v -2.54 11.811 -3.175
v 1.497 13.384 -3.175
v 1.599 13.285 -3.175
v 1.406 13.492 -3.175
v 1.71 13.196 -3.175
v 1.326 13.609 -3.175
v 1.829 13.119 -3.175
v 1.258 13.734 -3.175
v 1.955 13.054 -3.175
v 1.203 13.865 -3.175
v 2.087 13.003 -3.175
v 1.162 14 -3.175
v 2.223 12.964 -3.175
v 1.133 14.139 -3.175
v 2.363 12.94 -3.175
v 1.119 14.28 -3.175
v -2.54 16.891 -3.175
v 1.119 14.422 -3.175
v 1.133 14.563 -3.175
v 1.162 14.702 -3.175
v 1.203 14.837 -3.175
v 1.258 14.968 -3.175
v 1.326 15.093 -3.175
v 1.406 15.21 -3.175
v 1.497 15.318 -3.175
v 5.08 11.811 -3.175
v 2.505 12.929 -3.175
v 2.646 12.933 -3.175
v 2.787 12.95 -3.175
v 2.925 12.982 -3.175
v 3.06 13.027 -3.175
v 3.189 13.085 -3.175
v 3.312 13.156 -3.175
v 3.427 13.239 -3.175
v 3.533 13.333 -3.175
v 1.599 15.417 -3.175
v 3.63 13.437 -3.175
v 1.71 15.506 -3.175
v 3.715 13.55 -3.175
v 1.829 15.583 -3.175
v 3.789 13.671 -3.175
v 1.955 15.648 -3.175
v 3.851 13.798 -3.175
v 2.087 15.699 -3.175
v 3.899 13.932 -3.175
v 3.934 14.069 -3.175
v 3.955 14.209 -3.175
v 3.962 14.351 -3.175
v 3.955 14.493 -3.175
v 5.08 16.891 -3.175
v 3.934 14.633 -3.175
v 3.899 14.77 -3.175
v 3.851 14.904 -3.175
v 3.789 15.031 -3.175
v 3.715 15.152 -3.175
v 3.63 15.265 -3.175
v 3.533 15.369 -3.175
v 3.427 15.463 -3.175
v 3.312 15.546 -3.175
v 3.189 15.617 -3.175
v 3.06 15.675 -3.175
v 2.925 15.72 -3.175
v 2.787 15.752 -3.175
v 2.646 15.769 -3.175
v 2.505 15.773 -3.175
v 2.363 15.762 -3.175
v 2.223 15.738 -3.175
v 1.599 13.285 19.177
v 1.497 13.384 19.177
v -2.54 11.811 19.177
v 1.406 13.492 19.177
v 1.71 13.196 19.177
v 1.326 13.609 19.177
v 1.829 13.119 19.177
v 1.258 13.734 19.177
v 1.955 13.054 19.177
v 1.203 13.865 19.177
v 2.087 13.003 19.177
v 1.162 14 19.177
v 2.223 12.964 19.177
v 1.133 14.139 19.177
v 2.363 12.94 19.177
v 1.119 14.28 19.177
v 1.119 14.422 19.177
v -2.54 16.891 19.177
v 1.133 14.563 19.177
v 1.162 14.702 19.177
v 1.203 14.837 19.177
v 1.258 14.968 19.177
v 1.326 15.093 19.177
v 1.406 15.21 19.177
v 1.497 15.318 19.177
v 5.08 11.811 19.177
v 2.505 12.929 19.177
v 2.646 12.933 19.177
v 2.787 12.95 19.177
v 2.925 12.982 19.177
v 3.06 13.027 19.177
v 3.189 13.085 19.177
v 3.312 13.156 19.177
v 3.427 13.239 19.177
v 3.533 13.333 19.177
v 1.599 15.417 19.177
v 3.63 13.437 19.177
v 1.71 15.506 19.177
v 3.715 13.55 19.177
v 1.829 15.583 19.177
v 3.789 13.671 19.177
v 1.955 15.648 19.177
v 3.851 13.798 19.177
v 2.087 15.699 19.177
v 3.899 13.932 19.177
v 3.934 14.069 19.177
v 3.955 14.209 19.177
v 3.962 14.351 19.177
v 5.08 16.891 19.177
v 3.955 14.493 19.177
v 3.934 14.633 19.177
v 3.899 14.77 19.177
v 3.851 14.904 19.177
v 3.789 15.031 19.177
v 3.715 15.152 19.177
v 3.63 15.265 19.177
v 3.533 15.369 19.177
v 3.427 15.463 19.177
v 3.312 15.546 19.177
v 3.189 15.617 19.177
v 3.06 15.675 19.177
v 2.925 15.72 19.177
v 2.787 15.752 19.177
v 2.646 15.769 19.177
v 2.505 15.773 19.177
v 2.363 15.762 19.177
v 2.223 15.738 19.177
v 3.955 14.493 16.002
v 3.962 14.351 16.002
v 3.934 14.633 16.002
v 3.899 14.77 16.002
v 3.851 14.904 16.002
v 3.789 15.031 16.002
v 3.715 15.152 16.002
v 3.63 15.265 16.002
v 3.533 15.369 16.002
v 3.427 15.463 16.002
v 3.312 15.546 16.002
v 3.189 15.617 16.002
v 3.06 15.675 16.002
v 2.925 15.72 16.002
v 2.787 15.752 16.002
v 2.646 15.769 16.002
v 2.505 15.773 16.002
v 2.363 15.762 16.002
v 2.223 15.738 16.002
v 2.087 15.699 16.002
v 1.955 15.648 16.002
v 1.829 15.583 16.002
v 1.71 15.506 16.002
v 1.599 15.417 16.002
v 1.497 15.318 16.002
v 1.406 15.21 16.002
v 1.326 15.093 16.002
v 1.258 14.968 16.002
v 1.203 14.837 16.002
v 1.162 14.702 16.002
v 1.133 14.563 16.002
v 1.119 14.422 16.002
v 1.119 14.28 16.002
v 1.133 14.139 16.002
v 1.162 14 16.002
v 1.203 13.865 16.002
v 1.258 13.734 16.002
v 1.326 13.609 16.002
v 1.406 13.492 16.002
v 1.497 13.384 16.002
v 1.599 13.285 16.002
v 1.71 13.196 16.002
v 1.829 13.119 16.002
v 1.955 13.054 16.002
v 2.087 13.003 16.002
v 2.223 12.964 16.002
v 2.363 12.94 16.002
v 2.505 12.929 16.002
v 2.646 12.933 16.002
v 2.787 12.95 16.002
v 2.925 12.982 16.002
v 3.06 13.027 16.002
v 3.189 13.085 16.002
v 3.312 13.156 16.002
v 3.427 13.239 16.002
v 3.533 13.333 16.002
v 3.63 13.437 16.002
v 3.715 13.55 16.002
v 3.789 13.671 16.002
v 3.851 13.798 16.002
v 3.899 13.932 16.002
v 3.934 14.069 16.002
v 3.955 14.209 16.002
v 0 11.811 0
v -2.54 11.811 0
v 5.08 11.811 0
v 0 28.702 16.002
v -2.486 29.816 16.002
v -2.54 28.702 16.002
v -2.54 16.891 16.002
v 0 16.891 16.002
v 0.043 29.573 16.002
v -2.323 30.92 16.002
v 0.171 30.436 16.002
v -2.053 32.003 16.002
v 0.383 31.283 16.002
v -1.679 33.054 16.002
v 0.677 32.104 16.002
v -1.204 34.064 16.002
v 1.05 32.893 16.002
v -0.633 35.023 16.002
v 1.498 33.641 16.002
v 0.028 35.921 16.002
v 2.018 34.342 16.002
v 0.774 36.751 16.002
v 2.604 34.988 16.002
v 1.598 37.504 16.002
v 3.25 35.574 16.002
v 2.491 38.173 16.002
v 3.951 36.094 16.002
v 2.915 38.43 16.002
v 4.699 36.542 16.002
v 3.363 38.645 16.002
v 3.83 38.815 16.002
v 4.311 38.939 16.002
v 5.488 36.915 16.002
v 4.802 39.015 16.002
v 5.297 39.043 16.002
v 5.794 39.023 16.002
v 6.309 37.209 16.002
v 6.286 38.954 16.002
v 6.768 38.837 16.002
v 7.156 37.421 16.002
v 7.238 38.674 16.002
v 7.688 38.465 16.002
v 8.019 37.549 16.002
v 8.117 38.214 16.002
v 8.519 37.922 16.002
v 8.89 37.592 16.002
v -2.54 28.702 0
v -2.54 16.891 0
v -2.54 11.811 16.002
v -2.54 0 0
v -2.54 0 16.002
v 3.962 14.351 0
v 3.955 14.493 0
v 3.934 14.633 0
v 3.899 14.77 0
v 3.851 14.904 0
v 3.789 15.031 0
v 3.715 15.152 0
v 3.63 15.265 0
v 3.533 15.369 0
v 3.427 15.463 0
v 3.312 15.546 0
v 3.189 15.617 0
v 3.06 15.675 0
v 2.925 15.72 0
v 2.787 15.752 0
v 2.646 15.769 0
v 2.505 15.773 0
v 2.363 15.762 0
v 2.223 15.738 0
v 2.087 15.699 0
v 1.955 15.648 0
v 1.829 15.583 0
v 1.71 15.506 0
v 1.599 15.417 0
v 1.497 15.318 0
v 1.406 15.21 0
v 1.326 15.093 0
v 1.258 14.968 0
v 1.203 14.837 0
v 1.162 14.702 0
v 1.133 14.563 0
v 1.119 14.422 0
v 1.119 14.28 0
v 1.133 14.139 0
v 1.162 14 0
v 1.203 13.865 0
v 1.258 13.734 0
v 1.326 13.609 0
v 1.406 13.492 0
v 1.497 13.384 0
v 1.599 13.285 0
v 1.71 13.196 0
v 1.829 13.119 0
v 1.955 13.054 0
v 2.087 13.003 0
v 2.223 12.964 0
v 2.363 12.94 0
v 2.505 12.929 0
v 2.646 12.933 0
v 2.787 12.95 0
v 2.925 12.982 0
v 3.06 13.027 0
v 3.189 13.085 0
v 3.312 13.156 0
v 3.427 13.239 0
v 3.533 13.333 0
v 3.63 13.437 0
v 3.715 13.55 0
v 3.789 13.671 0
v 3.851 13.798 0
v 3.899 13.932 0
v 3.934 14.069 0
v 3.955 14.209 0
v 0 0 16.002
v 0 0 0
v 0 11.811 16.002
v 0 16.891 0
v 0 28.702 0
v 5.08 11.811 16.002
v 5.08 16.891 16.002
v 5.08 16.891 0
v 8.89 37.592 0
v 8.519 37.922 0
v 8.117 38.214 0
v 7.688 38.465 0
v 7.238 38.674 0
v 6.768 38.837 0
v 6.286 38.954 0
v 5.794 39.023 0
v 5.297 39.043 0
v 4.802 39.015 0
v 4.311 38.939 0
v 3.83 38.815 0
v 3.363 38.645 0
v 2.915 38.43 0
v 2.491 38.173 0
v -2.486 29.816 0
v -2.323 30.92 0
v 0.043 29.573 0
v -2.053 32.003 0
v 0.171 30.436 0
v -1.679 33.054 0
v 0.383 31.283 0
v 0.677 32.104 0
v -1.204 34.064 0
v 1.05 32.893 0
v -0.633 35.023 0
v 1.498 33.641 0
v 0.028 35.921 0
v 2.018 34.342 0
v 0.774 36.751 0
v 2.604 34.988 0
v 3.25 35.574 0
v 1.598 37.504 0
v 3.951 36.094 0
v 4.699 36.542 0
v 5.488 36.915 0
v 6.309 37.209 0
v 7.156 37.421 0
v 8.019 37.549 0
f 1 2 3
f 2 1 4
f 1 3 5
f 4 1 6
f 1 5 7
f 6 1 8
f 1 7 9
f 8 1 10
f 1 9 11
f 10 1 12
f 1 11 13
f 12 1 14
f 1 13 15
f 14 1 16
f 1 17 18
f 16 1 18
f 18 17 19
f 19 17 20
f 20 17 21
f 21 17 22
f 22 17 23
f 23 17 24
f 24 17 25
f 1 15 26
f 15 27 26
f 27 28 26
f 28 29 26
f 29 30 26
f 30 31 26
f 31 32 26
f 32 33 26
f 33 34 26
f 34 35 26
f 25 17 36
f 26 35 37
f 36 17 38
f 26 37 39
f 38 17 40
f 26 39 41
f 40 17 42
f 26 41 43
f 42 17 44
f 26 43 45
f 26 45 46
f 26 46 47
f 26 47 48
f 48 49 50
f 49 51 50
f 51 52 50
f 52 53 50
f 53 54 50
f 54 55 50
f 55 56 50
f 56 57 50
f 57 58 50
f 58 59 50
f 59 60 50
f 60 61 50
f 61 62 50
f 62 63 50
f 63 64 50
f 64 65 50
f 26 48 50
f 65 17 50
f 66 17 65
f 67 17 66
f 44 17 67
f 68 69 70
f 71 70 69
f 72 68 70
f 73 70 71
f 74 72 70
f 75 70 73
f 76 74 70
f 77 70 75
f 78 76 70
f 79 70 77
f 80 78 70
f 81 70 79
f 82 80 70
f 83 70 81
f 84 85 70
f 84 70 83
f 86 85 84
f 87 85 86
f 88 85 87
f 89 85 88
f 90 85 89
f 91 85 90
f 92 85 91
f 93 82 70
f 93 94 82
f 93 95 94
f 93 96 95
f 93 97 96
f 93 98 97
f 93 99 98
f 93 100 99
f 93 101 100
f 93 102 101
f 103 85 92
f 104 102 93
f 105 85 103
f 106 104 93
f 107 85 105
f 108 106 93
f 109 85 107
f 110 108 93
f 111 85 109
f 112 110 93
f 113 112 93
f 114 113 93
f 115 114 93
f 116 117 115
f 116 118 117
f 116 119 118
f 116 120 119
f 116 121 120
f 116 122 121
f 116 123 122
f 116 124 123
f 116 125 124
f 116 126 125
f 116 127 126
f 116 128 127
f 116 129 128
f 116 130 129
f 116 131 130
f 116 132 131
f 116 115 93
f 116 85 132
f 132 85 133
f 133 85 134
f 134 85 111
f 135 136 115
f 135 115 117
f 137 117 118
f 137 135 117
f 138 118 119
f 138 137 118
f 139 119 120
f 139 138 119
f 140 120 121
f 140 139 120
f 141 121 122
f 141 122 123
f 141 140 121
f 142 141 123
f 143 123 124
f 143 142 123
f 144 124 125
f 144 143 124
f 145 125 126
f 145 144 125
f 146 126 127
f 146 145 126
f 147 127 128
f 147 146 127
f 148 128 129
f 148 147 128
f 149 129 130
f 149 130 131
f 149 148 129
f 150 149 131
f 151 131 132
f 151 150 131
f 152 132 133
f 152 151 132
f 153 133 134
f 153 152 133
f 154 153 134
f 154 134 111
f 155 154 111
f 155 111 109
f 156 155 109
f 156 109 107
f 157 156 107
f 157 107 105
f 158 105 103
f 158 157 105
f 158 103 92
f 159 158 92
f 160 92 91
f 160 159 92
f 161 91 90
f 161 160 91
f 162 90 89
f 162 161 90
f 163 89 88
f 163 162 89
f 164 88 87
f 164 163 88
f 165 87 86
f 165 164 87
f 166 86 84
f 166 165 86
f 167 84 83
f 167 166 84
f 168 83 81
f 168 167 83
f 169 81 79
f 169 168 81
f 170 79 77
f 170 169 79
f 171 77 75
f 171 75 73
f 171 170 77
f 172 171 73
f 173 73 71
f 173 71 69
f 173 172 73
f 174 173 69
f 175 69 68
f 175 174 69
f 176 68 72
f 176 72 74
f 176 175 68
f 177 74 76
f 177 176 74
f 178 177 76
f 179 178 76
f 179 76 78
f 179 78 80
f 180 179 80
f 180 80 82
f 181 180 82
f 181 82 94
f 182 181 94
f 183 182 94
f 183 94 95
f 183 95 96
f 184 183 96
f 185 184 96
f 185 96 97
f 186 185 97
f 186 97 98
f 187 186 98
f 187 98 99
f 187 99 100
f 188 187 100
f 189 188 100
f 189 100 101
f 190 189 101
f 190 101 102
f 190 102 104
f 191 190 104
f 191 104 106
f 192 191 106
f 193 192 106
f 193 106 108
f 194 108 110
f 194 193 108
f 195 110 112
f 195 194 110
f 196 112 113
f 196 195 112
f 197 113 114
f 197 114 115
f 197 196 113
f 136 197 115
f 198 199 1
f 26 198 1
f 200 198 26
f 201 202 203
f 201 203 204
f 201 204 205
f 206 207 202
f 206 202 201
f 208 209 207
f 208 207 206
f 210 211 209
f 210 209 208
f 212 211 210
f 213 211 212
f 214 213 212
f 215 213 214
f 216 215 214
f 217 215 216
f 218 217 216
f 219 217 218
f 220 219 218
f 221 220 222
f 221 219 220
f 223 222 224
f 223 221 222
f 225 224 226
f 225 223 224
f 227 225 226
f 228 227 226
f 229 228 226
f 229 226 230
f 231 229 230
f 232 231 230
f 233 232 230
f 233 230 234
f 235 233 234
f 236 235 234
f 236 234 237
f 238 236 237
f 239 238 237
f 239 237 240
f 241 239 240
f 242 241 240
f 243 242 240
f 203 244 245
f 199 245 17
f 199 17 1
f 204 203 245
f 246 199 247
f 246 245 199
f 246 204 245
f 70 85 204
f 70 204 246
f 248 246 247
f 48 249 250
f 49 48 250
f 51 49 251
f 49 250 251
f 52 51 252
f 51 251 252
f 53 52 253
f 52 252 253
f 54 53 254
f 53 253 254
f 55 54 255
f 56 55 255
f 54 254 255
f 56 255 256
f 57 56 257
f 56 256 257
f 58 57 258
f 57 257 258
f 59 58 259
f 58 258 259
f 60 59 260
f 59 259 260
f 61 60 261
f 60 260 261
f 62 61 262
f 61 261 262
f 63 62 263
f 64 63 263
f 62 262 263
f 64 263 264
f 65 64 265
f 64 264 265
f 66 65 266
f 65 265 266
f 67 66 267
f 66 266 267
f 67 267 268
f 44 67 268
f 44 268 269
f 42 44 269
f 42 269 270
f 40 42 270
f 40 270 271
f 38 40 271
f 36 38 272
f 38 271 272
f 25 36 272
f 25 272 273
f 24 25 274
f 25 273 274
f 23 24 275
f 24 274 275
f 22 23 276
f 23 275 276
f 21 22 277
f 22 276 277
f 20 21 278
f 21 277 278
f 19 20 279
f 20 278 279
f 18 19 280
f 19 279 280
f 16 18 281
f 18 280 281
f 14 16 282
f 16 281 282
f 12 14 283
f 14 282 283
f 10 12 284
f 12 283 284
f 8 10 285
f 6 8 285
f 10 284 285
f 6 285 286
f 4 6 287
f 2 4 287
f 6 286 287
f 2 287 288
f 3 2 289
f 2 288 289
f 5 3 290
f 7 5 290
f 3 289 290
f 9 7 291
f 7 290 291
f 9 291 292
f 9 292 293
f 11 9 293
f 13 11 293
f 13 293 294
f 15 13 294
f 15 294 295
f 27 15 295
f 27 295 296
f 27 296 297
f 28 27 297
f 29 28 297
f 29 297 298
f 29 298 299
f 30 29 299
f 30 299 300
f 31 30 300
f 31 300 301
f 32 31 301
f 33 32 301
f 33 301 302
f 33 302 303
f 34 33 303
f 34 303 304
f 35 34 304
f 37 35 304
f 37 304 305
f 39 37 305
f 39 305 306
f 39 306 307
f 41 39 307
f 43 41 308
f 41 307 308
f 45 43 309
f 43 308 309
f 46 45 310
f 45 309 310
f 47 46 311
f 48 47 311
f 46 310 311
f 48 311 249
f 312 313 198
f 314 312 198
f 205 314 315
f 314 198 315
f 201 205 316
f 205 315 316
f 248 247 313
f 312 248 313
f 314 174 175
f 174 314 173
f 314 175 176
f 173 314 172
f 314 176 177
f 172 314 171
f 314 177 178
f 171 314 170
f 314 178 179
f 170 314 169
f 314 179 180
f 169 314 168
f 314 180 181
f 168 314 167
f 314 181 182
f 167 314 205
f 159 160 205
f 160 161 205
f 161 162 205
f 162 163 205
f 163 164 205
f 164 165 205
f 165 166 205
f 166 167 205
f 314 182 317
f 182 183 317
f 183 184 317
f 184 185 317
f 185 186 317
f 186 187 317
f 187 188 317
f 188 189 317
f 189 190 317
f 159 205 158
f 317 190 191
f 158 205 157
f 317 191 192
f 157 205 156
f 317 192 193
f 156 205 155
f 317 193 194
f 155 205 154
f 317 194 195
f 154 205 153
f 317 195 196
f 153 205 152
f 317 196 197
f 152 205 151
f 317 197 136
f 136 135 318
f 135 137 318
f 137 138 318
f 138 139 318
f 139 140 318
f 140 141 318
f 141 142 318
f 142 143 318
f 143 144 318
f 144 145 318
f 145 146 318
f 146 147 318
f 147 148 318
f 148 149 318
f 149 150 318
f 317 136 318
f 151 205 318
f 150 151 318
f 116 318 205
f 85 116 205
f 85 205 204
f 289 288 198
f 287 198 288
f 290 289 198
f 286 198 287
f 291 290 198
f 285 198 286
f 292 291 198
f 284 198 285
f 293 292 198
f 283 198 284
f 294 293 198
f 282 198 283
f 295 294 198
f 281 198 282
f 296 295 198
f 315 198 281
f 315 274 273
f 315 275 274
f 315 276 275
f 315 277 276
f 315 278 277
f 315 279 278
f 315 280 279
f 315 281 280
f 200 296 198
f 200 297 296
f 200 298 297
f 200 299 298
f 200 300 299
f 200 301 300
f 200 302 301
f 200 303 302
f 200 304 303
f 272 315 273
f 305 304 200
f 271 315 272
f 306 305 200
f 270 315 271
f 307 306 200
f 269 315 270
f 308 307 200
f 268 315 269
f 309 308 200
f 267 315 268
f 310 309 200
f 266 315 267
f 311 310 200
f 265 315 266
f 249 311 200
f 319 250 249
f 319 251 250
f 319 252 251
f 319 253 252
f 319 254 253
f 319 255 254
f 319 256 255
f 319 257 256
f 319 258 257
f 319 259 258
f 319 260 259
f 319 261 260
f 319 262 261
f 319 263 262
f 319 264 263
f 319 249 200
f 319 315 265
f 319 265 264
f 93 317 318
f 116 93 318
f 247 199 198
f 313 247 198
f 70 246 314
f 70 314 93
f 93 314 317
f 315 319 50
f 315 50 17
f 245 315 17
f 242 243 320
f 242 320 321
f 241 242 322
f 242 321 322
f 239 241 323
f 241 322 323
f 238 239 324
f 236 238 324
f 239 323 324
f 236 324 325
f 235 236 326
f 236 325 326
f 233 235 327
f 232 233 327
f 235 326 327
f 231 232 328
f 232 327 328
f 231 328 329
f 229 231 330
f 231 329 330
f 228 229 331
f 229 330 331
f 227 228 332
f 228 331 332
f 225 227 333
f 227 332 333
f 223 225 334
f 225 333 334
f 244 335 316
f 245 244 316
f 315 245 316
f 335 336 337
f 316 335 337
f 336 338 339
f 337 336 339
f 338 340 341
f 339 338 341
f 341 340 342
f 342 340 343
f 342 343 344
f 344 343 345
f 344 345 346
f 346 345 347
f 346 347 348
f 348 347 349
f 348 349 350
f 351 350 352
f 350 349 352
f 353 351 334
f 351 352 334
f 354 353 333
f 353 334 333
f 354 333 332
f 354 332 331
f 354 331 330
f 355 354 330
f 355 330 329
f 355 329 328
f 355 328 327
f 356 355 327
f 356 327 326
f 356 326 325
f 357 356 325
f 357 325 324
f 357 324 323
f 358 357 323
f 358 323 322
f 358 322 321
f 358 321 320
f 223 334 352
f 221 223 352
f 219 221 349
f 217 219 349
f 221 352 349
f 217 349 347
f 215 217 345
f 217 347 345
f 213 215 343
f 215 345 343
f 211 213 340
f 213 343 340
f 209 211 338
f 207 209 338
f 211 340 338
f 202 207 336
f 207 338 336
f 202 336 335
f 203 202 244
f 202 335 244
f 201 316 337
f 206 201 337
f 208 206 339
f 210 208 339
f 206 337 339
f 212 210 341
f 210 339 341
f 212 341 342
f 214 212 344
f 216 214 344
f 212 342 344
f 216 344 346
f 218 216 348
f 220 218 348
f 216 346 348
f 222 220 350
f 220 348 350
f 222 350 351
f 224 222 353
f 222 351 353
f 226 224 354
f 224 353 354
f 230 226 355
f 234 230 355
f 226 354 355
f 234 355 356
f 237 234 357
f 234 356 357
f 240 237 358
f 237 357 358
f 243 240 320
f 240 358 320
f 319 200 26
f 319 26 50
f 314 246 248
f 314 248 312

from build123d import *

# Parameters (mm, degrees)
SURFACE_EXTRUDE2_1_DEPTH = 16.002
THICKEN2_T1              = 2.54
FILLET3_R                = 5.08
SURFACE_KNIT2_DEPTH      = 16.002
SKETCH6_R                = 1.4224
BOSS_EXTRUDE1_DEPTH      = 3.175


with BuildPart() as body_1:
    # Surface-Extrude2: a surface, the sketch's curves swept straight by 16.002 mm
    with BuildLine(Plane.XY, mode=Mode.PRIVATE) as surface_extrude2_1_path:
        Line((0, 0), (0, 28.702))
        ThreePointArc((0, 28.702), (2.603820715, 34.988179285), (8.89, 37.592))
    surface_extrude2_1 = Shell.extrude(surface_extrude2_1_path.wire(), (0 * SURFACE_EXTRUDE2_1_DEPTH, 0 * SURFACE_EXTRUDE2_1_DEPTH, 1 * SURFACE_EXTRUDE2_1_DEPTH))
    add(Solid.thicken(surface_extrude2_1, THICKEN2_T1))

    # Fillet3
    # the kernel refuses this fillet: 5.08 mm, written as the material it takes off along each edge
    with BuildSketch(Plane(origin=(8.89, 40.132, -16.731806751), x_dir=(-0.9561828874675108, -0.29277002188457374, 0), z_dir=(0, 0, 1))) as fillet3_piece_1:
        with BuildLine():
            CenterArc((5.205450989, 4.857409068), FILLET3_R, 208.560825218, 78.463040967)
            Line((0.743635856, 2.428704534), (0.654399553, 2.380130443))
            ThreePointArc((0.654399553, 2.380130443), (0.274669746, 1.244097701), (-0.097148181, 0.029745434))
            Line((-0.097148181, 0.029745434), (-0.029745434, -0.097148181))
            ThreePointArc((-0.029745434, -0.097148181), (3.34636135, -0.602429596), (6.722468135, -0.097148181))
            Line((6.722468135, -0.097148181), (6.6927227, 0))
        make_face()
    extrude(amount=49.465613501, mode=Mode.SUBTRACT)


with BuildPart() as body_2:
    # Surface-Knit2: read off the stored shape, not the designer's step
    # Surface-Knit2 outline → Surface-Knit2 (new body)
    with BuildSketch(Plane.XY):
        with BuildLine():
            Line((-2.54, 28.702), (-2.54, 0))
            Line((-2.54, 0), (0, 0))
            Line((0, 0), (0, 28.702))
            ThreePointArc((0, 28.702), (2.603820715, 34.988179285), (8.89, 37.592))
            ThreePointArc((8.89, 37.592), (5.793722616, 39.022651388), (2.490533083, 38.172571429))
            ThreePointArc((2.490533083, 38.172571429), (-1.204325308, 34.063855702), (-2.54, 28.702))
        make_face()
    extrude(amount=SURFACE_KNIT2_DEPTH)

    # Sketch6 → Boss-Extrude1 (add)
    with BuildSketch(Plane.XY.offset(16.002)):
        Polygon((0, 11.811), (5.08, 11.811), (5.08, 16.891), (0, 16.891), (-2.54, 16.891), (-2.54, 11.811), align=None)
        with Locations((2.54, 14.351)):
            Circle(SKETCH6_R, mode=Mode.SUBTRACT)
    boss_extrude1 = extrude(amount=BOSS_EXTRUDE1_DEPTH)

    # Mirror1: Boss-Extrude1 across plane
    add(boss_extrude1.mirror(Plane(origin=(0, 0, 8.001), x_dir=(1, 0, 0), z_dir=(0, 0, -1))))


solid = body_2.part
